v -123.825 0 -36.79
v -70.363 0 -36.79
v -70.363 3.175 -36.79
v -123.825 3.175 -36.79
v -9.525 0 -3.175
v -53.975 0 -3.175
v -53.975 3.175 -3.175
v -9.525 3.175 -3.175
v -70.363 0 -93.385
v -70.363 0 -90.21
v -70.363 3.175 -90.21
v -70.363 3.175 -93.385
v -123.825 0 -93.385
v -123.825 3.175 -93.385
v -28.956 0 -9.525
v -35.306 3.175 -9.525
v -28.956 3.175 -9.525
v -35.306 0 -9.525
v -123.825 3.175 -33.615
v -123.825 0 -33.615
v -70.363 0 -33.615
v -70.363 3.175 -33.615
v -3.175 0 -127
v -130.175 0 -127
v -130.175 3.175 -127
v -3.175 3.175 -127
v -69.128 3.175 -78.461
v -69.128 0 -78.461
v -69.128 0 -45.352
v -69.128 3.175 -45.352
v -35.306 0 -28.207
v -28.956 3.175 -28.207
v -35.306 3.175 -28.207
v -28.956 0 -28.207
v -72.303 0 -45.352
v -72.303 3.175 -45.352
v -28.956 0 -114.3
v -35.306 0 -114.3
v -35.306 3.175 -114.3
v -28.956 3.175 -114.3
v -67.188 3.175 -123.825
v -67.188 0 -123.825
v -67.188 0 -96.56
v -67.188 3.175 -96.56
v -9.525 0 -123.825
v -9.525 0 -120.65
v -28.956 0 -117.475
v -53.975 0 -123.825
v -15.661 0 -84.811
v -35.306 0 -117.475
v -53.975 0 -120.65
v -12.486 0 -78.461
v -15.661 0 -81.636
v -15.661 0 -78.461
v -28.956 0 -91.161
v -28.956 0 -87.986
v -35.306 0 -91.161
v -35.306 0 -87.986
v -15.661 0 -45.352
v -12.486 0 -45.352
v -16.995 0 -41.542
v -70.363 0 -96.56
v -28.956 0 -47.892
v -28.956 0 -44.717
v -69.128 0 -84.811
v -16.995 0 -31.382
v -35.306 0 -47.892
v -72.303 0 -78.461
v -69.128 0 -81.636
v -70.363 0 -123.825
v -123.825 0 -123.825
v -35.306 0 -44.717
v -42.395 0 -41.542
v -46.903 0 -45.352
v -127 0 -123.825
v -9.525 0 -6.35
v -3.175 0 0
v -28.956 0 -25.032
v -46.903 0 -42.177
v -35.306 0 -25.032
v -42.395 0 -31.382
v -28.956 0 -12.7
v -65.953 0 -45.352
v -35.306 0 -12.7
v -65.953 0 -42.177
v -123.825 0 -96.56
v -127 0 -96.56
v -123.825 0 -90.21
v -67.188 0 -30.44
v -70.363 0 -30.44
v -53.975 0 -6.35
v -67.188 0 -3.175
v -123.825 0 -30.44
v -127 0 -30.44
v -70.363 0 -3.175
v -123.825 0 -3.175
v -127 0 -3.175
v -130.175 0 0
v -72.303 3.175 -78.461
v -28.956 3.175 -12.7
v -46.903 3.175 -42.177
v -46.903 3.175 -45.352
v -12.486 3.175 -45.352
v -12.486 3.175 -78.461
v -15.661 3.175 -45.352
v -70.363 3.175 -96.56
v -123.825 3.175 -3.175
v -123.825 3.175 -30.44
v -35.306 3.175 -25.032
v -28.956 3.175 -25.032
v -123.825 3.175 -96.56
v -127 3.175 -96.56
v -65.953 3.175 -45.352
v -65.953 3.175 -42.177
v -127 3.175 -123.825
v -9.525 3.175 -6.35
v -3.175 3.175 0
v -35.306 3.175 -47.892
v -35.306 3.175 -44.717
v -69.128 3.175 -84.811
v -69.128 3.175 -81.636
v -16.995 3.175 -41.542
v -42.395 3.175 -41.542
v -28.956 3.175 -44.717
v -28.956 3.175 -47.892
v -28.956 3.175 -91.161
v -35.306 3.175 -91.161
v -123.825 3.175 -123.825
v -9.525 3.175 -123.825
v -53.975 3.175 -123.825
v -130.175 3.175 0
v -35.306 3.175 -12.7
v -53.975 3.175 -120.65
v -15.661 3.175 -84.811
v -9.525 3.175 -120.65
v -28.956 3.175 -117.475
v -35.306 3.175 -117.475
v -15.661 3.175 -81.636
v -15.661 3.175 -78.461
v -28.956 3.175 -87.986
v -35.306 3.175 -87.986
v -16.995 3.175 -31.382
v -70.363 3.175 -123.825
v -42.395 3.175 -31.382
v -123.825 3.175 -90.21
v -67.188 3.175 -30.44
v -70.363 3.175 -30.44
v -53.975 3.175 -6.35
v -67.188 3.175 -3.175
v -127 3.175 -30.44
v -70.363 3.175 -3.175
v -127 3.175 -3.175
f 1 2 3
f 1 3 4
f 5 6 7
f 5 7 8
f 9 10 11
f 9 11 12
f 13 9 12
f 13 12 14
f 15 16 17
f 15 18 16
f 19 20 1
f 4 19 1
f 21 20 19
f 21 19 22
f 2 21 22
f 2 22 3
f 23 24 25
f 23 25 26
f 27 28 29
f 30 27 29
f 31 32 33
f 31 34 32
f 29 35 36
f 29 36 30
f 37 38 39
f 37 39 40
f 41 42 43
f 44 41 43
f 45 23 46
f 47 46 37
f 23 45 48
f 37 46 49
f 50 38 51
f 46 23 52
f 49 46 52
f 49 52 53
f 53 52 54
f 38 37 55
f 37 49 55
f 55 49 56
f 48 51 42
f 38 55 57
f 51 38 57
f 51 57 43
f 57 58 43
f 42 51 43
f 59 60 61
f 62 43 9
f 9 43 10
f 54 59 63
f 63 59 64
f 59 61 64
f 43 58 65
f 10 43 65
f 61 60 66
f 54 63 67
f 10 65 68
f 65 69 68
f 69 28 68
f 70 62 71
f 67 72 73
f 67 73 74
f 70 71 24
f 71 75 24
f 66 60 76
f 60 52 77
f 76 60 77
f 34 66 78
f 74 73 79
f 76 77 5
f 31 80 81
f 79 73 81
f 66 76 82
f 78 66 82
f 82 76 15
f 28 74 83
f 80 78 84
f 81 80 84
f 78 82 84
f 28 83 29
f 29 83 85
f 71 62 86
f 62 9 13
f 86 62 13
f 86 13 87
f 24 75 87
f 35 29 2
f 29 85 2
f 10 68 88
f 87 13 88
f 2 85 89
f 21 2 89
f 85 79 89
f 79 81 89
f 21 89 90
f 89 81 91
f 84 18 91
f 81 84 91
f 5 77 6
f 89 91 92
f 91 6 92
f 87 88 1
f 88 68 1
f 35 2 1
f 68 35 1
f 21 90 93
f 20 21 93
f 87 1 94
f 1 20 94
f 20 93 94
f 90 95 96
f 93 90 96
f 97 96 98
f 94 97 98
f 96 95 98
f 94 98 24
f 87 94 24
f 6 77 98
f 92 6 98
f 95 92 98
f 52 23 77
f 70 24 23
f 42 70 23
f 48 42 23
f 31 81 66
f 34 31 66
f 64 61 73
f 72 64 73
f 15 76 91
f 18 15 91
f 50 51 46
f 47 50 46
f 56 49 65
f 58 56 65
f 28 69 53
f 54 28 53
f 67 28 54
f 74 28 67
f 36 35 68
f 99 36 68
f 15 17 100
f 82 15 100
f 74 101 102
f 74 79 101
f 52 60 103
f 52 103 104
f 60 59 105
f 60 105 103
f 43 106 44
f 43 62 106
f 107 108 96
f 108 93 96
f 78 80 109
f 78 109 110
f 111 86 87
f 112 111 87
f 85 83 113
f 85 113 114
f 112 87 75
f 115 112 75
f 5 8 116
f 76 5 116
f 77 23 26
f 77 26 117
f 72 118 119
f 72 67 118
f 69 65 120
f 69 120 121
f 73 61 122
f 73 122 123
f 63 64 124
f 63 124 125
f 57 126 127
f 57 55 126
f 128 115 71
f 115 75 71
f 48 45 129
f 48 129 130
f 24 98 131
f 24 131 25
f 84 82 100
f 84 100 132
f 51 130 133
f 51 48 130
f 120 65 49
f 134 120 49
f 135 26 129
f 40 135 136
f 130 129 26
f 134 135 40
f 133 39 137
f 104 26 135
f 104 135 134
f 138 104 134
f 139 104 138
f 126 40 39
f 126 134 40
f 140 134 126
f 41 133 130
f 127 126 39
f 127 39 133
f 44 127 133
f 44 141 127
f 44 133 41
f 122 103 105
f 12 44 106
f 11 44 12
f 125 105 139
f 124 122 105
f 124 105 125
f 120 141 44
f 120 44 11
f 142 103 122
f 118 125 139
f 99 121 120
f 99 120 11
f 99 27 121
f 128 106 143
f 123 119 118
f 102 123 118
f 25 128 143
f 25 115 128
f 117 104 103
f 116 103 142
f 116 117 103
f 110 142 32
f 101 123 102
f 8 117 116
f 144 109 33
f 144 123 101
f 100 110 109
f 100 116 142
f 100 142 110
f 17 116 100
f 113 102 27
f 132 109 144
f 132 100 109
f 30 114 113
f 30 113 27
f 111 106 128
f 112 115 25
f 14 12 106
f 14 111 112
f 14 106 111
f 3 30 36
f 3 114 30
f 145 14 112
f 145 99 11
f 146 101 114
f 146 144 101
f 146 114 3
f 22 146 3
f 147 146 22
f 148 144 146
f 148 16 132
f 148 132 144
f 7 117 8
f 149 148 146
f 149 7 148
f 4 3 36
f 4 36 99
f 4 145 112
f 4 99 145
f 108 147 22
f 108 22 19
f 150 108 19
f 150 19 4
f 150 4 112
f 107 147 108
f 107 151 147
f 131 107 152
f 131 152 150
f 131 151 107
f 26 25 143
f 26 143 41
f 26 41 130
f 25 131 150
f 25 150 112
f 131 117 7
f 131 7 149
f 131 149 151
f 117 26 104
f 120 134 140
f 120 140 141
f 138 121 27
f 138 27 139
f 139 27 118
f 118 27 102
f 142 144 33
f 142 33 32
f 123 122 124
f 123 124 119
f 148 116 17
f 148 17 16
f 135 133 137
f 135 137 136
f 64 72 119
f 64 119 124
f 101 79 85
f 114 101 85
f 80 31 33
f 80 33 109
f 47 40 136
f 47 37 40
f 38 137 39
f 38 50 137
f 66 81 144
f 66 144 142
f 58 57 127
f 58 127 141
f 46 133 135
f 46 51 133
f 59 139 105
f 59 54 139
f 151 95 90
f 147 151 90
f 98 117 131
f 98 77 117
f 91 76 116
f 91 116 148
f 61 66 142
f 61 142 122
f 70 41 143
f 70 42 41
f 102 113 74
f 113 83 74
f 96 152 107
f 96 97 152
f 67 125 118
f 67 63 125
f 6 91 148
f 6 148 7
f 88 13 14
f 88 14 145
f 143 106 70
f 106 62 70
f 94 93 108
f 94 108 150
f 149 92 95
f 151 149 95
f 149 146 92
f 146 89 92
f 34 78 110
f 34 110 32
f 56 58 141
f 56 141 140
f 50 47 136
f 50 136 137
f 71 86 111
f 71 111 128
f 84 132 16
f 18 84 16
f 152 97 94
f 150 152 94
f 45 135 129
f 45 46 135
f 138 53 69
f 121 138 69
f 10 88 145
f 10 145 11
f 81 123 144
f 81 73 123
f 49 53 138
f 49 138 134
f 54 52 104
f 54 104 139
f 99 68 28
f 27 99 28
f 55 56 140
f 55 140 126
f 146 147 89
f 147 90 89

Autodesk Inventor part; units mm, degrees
ref_plane "YZ Plane" through (0, 0, 0) normal (1, 0, 0) x (0, 1, 0)
ref_plane "XZ Plane" through (0, 0, 0) normal (0, 1, 0) x (-1, 0, 0)
ref_plane "XY Plane" through (0, 0, 0) normal (0, 0, 1) x (1, 0, 0)
sketch "Sketch1" plane through (0, 0, 0) normal (0, 1, 0) x (-1, 0, 0)
  line L0 (0, 0) -> (127, 0)
  line L1 (127, 0) -> (127, -127)
  line L2 (127, -127) -> (0, -127)
  line L3 (0, -127) -> (0, 0)
  line L4 (123.825, 0) -> (127, 0)
  line L5 (127, 0) -> (127, -33.615)
  line L6 (127, -33.615) -> (123.825, -33.615)
  line L7 (123.825, -33.615) -> (123.825, 0)
  line L8 (123.825, -33.615) -> (70.363, -33.615)
  line L9 (70.363, -33.615) -> (70.363, -36.79)
  line L10 (70.363, -36.79) -> (127, -36.79)
  line L11 (70.363, -36.79) -> (67.188, -36.79)
  line L12 (67.188, -36.79) -> (67.188, 0)
  line L13 (67.188, 0) -> (70.363, 0)
  line L14 (70.363, 0) -> (70.363, -36.79)
  line L15 (69.1283, -45.3517) -> (43.7283, -45.3517)
  line L16 (43.7283, -45.3517) -> (43.7283, -42.1767)
  line L17 (43.7283, -42.1767) -> (69.1283, -42.1767)
  line L18 (69.1283, -42.1767) -> (69.1283, -45.3517)
  line L19 (69.1283, -42.1767) -> (72.3033, -42.1767)
  line L20 (72.3033, -42.1767) -> (72.3033, -84.8107)
  line L21 (72.3033, -84.8107) -> (69.1283, -84.8107)
  line L22 (69.1283, -84.8107) -> (69.1283, -42.1767)
  line L23 (69.1283, -84.8107) -> (12.4863, -84.8107)
  line L24 (12.4863, -84.8107) -> (12.4863, -81.6357)
  line L25 (12.4863, -81.6357) -> (69.1283, -81.6357)
  line L26 (69.1283, -81.6357) -> (69.1283, -84.8107)
  line L27 (12.4863, -81.6357) -> (15.6613, -81.6357)
  line L28 (15.6613, -81.6357) -> (15.6613, -42.1767)
  line L29 (15.6613, -42.1767) -> (12.4863, -42.1767)
  line L30 (12.4863, -42.1767) -> (12.4863, -81.6357)
  line L31 (127, -90.21) -> (67.188, -90.21)
  line L32 (67.188, -90.21) -> (67.188, -93.385)
  line L33 (67.188, -93.385) -> (127, -93.385)
  line L34 (127, -93.385) -> (127, -90.21)
  line L35 (127, -93.385) -> (123.825, -93.385)
  line L36 (123.825, -93.385) -> (123.825, -127)
  line L37 (123.825, -127) -> (127, -127)
  line L38 (127, -127) -> (127, -93.385)
  line L39 (25.4, 0) -> (6.35, 0)
  line L40 (25.4, -127) -> (6.35, -127)
  line L41 (67.188, -90.21) -> (70.363, -90.21)
  line L42 (70.363, -90.21) -> (70.363, -127)
  line L43 (70.363, -127) -> (67.188, -127)
  line L44 (67.188, -127) -> (67.188, -90.21)
  line L45 (67.188, -3.175) -> (70.363, -3.175)
  line L46 (70.363, -3.175) -> (70.363, -33.615)
  line L47 (70.363, -33.615) -> (67.188, -33.615)
  line L48 (67.188, -33.615) -> (67.188, -3.175)
  line L49 (73.538, -33.615) -> (123.825, -33.615)
  line L50 (123.825, -33.615) -> (123.825, -36.79)
  line L51 (123.825, -36.79) -> (73.538, -36.79)
  line L52 (127, -3.175) -> (123.825, -3.175)
  line L53 (123.825, -3.175) -> (123.825, -30.44)
  line L54 (123.825, -30.44) -> (127, -30.44)
  line L55 (127, -30.44) -> (127, -3.175)
  line L56 (123.825, -90.21) -> (81.7068, -90.21)
  line L57 (81.7068, -93.385) -> (123.825, -93.385)
  line L58 (123.825, -93.385) -> (123.825, -90.21)
  line L59 (123.825, -96.56) -> (127, -96.56)
  line L60 (127, -96.56) -> (127, -123.825)
  line L61 (127, -123.825) -> (123.825, -123.825)
  line L62 (123.825, -123.825) -> (123.825, -96.56)
  line L63 (70.363, -96.56) -> (67.188, -96.56)
  line L64 (67.188, -96.56) -> (67.188, -123.825)
  line L65 (67.188, -123.825) -> (70.363, -123.825)
  line L66 (70.363, -123.825) -> (70.363, -96.56)
  line L67 (70.363, -30.44) -> (67.188, -30.44)
  line L68 (72.3033, -45.3517) -> (69.1283, -45.3517)
  line L69 (69.1283, -45.3517) -> (69.1283, -81.6357)
  line L70 (69.1283, -81.6357) -> (72.3033, -81.6357)
  line L71 (72.3033, -81.6357) -> (72.3033, -45.3517)
  line L72 (65.9533, -42.1767) -> (46.9033, -42.1767)
  line L73 (46.9033, -42.1767) -> (46.9033, -45.3517)
  line L74 (46.9033, -45.3517) -> (65.9533, -45.3517)
  line L75 (65.9533, -45.3517) -> (65.9533, -42.1767)
  line L76 (60.0198, -81.6357) -> (15.6613, -81.6357)
  line L77 (15.6613, -81.6357) -> (15.6613, -84.8107)
  line L78 (15.6613, -84.8107) -> (60.0198, -84.8107)
  line L79 (15.6613, -45.3517) -> (12.4863, -45.3517)
  line L80 (12.4863, -45.3517) -> (12.4863, -78.4607)
  line L81 (12.4863, -78.4607) -> (15.6613, -78.4607)
  line L82 (15.6613, -78.4607) -> (15.6613, -45.3517)
  line L83 (72.3033, -78.4607) -> (69.1283, -78.4607)
  line L84 (22.225, 0) -> (9.525, 0)
  line L85 (9.525, -127) -> (22.225, -127)
  line L86 (57.15, -3.175) -> (6.35, -3.175)
  line L87 (6.35, -3.175) -> (6.35, -6.35)
  line L88 (6.35, -6.35) -> (57.15, -6.35)
  line L89 (57.15, -6.35) -> (57.15, -3.175)
  line L90 (53.975, -3.175) -> (9.525, -3.175)
  line L91 (9.525, -3.175) -> (9.525, -6.35)
  line L92 (9.525, -6.35) -> (53.975, -6.35)
  line L93 (53.975, -6.35) -> (53.975, -3.175)
  line L94 (127, 0) -> (130.175, 0)
  line L95 (130.175, 0) -> (130.175, -127)
  line L96 (130.175, -127) -> (127, -127)
  line L97 (127, -127) -> (127, 0)
  line L98 (3.175, 0) -> (0, 0)
  line L99 (0, 0) -> (0, -127)
  line L100 (0, -127) -> (3.175, -127)
  line L101 (3.175, -127) -> (3.175, 0)
  line L102 (57.15, -120.65) -> (6.35, -120.65)
  line L103 (6.35, -120.65) -> (6.35, -123.825)
  line L104 (6.35, -123.825) -> (57.15, -123.825)
  line L105 (57.15, -123.825) -> (57.15, -120.65)
  line L106 (53.975, -120.65) -> (9.525, -120.65)
  line L107 (9.525, -120.65) -> (9.525, -123.825)
  line L108 (9.525, -123.825) -> (53.975, -123.825)
  line L109 (53.975, -123.825) -> (53.975, -120.65)
  line L110 (42.3948, -31.3817) -> (16.9948, -31.3817)
  line L111 (16.9948, -31.3817) -> (16.9948, -41.5417)
  line L112 (16.9948, -41.5417) -> (42.3948, -41.5417)
  line L113 (42.3948, -41.5417) -> (42.3948, -31.3817)
  line L114 (35.306, -9.525) -> (28.956, -9.525)
  line L115 (28.956, -9.525) -> (28.956, -12.7)
  line L116 (28.956, -12.7) -> (35.306, -12.7)
  line L117 (35.306, -12.7) -> (35.306, -9.525)
  line L118 (35.306, -25.0317) -> (28.956, -25.0317)
  line L119 (28.956, -25.0317) -> (28.956, -28.2067)
  line L120 (28.956, -28.2067) -> (35.306, -28.2067)
  line L121 (35.306, -28.2067) -> (35.306, -25.0317)
  line L122 (35.306, -44.7167) -> (28.956, -44.7167)
  line L123 (28.956, -44.7167) -> (28.956, -47.8917)
  line L124 (28.956, -47.8917) -> (35.306, -47.8917)
  line L125 (35.306, -47.8917) -> (35.306, -44.7167)
  line L126 (35.306, -87.9857) -> (28.956, -87.9857)
  line L127 (28.956, -87.9857) -> (28.956, -91.1607)
  line L128 (28.956, -91.1607) -> (35.306, -91.1607)
  line L129 (35.306, -91.1607) -> (35.306, -87.9857)
  line L130 (35.306, -114.3) -> (28.956, -114.3)
  line L131 (28.956, -114.3) -> (28.956, -117.475)
  line L132 (28.956, -117.475) -> (35.306, -117.475)
  line L133 (35.306, -117.475) -> (35.306, -114.3)
  point P0 (97.094, -33.615)
  point P1 (123.825, -110.1925)
  point P2 (123.825, -16.8075)
  point P3 (43.7283, -43.7642)
  point P4 (56.4283, -42.1767)
  point P5 (125.4125, 0)
  point P6 (125.4125, -3.175)
  point P7 (125.4125, -33.615)
  point P8 (70.363, -35.2025)
  point P9 (68.7755, -36.79)
  point P10 (68.7755, -33.615)
  point P11 (68.7755, 0)
  point P12 (68.7755, -3.175)
  point P13 (68.7755, -127)
  point P14 (68.7755, -123.825)
  point P15 (69.1283, -43.7642)
  point P16 (46.9033, -43.7642)
  point P17 (70.7158, -42.1767)
  point P18 (12.4863, -83.2232)
  point P19 (14.0738, -81.6357)
  point P20 (14.0738, -78.4607)
  point P21 (14.0738, -42.1767)
  point P22 (14.0738, -45.3517)
  point P23 (70.363, -93.385)
  point P24 (70.363, -30.44)
  point P25 (127, -96.56)
  point P26 (127, -30.44)
  point P27 (123.825, -33.615)
  point P28 (46.9033, -42.1767)
  point P29 (67.188, -96.56)
  point P30 (53.975, -4.7625)
  point P31 (53.975, -122.2375)
  point P32 (6.35, -122.2375)
  point P33 (15.875, -127)
  point P34 (127, -93.385)
  point P35 (53.975, -6.35)
  point P36 (32.131, -91.1607)
  dimension "d0" = 127
  dimension "d2" = 127
  dimension "d5" = 33.615
  dimension "d6" = 33.615
  dimension "d7" = 53.462
  dimension "d8" = 53.462
  dimension "d9" = 3.175
  dimension "d10" = 3.175
  dimension "d11" = 3.175
  dimension "d12" = 3.175
  dimension "d13" = 3.175
  dimension "d14" = 3.175
  dimension "d19" = 36.284
  dimension "d20" = 25.4
  dimension "d21" = 3.175
  dimension "d22" = 3.175
  dimension "d23" = 3.175
  dimension "d24" = 3.175
  dimension "d25" = 53.467
  dimension "d27" = 42.1767
  dimension "d28" = 3.175
  dimension "d29" = 3.175
  dimension "d30" = 3.175
  dimension "d32" = 3.175
  dimension "d33" = 3.175
  dimension "d34" = 3.175
  dimension "d35" = 3.175
  dimension "d36" = 3.175
  dimension "d37" = 3.175
  dimension "d38" = 3.175
  dimension "d39" = 3.175
  dimension "d40" = 3.175
  dimension "d41" = 3.175
  dimension "d42" = 3.175
  dimension "d43" = 3.175
  dimension "d44" = 3.175
  dimension "d45" = 3.175
  dimension "d46" = 3.175
  dimension "d51" = 3.175
  dimension "d52" = 3.175
  dimension "d53" = 3.175
  dimension "d54" = 50.8
  dimension "d55" = 3.175
  dimension "d56" = 6.35
  dimension "d57" = 3.175
  dimension "d58" = 3.175
  dimension "d59" = 3.175
  dimension "d60" = 3.175
  dimension "d61" = 3.175
  dimension "d62" = 50.8
  dimension "d63" = 6.35
  dimension "d64" = 3.175
  dimension "d65" = 9.3112
  dimension "d66" = 25.4
  dimension "d67" = 10.16
  dimension "d68" = 3.81
  dimension "d69" = 1.3335
  dimension "d70" = 6.35
  dimension "d71" = 3.175
  dimension "d72" = 3.175
  dimension "d73" = 6.35
  dimension "d74" = 3.175
  dimension "d75" = 3.175
  dimension "d76" = 6.35
extrude "Extrusion1" add sketch "Sketch1" along normal blind 3.175 contours L0 L12 L11 L10 L1 L31 L32 L44 L2 L101 | L0 L14 L45 L12 | L0 L7 L8 L14 | L44 L65 L42 L2 | L0 L1 L52 L7 | L67 L14 L47 L12 | L42 L33 L36 L2 | L94 L95 L96 L1 | L47 L9 L11 L12 | L36 L61 L1 L2 | L44 L33 L42 L63 | L54 L1 L6 L7 | L32 L31 L42 L33 | L6 L1 L10 L50 | L36 L33 L1 L59 | L58 L31 L1 L33 | L15 L75 L17 L18 | L18 L19 L20 L68 | L83 L20 L70 L22 | L15 L16 L17 L73 | L70 L20 L21 L22 | L77 L23 L24 L25 | L25 L30 L81 L28 | L79 L30 L29 L28 | L89 L88 L93 L86 | L91 L88 L87 L86 | L105 L104 L109 L102 | L107 L104 L103 L102
equation "\"d3\" = d41"
properties part number "top"
